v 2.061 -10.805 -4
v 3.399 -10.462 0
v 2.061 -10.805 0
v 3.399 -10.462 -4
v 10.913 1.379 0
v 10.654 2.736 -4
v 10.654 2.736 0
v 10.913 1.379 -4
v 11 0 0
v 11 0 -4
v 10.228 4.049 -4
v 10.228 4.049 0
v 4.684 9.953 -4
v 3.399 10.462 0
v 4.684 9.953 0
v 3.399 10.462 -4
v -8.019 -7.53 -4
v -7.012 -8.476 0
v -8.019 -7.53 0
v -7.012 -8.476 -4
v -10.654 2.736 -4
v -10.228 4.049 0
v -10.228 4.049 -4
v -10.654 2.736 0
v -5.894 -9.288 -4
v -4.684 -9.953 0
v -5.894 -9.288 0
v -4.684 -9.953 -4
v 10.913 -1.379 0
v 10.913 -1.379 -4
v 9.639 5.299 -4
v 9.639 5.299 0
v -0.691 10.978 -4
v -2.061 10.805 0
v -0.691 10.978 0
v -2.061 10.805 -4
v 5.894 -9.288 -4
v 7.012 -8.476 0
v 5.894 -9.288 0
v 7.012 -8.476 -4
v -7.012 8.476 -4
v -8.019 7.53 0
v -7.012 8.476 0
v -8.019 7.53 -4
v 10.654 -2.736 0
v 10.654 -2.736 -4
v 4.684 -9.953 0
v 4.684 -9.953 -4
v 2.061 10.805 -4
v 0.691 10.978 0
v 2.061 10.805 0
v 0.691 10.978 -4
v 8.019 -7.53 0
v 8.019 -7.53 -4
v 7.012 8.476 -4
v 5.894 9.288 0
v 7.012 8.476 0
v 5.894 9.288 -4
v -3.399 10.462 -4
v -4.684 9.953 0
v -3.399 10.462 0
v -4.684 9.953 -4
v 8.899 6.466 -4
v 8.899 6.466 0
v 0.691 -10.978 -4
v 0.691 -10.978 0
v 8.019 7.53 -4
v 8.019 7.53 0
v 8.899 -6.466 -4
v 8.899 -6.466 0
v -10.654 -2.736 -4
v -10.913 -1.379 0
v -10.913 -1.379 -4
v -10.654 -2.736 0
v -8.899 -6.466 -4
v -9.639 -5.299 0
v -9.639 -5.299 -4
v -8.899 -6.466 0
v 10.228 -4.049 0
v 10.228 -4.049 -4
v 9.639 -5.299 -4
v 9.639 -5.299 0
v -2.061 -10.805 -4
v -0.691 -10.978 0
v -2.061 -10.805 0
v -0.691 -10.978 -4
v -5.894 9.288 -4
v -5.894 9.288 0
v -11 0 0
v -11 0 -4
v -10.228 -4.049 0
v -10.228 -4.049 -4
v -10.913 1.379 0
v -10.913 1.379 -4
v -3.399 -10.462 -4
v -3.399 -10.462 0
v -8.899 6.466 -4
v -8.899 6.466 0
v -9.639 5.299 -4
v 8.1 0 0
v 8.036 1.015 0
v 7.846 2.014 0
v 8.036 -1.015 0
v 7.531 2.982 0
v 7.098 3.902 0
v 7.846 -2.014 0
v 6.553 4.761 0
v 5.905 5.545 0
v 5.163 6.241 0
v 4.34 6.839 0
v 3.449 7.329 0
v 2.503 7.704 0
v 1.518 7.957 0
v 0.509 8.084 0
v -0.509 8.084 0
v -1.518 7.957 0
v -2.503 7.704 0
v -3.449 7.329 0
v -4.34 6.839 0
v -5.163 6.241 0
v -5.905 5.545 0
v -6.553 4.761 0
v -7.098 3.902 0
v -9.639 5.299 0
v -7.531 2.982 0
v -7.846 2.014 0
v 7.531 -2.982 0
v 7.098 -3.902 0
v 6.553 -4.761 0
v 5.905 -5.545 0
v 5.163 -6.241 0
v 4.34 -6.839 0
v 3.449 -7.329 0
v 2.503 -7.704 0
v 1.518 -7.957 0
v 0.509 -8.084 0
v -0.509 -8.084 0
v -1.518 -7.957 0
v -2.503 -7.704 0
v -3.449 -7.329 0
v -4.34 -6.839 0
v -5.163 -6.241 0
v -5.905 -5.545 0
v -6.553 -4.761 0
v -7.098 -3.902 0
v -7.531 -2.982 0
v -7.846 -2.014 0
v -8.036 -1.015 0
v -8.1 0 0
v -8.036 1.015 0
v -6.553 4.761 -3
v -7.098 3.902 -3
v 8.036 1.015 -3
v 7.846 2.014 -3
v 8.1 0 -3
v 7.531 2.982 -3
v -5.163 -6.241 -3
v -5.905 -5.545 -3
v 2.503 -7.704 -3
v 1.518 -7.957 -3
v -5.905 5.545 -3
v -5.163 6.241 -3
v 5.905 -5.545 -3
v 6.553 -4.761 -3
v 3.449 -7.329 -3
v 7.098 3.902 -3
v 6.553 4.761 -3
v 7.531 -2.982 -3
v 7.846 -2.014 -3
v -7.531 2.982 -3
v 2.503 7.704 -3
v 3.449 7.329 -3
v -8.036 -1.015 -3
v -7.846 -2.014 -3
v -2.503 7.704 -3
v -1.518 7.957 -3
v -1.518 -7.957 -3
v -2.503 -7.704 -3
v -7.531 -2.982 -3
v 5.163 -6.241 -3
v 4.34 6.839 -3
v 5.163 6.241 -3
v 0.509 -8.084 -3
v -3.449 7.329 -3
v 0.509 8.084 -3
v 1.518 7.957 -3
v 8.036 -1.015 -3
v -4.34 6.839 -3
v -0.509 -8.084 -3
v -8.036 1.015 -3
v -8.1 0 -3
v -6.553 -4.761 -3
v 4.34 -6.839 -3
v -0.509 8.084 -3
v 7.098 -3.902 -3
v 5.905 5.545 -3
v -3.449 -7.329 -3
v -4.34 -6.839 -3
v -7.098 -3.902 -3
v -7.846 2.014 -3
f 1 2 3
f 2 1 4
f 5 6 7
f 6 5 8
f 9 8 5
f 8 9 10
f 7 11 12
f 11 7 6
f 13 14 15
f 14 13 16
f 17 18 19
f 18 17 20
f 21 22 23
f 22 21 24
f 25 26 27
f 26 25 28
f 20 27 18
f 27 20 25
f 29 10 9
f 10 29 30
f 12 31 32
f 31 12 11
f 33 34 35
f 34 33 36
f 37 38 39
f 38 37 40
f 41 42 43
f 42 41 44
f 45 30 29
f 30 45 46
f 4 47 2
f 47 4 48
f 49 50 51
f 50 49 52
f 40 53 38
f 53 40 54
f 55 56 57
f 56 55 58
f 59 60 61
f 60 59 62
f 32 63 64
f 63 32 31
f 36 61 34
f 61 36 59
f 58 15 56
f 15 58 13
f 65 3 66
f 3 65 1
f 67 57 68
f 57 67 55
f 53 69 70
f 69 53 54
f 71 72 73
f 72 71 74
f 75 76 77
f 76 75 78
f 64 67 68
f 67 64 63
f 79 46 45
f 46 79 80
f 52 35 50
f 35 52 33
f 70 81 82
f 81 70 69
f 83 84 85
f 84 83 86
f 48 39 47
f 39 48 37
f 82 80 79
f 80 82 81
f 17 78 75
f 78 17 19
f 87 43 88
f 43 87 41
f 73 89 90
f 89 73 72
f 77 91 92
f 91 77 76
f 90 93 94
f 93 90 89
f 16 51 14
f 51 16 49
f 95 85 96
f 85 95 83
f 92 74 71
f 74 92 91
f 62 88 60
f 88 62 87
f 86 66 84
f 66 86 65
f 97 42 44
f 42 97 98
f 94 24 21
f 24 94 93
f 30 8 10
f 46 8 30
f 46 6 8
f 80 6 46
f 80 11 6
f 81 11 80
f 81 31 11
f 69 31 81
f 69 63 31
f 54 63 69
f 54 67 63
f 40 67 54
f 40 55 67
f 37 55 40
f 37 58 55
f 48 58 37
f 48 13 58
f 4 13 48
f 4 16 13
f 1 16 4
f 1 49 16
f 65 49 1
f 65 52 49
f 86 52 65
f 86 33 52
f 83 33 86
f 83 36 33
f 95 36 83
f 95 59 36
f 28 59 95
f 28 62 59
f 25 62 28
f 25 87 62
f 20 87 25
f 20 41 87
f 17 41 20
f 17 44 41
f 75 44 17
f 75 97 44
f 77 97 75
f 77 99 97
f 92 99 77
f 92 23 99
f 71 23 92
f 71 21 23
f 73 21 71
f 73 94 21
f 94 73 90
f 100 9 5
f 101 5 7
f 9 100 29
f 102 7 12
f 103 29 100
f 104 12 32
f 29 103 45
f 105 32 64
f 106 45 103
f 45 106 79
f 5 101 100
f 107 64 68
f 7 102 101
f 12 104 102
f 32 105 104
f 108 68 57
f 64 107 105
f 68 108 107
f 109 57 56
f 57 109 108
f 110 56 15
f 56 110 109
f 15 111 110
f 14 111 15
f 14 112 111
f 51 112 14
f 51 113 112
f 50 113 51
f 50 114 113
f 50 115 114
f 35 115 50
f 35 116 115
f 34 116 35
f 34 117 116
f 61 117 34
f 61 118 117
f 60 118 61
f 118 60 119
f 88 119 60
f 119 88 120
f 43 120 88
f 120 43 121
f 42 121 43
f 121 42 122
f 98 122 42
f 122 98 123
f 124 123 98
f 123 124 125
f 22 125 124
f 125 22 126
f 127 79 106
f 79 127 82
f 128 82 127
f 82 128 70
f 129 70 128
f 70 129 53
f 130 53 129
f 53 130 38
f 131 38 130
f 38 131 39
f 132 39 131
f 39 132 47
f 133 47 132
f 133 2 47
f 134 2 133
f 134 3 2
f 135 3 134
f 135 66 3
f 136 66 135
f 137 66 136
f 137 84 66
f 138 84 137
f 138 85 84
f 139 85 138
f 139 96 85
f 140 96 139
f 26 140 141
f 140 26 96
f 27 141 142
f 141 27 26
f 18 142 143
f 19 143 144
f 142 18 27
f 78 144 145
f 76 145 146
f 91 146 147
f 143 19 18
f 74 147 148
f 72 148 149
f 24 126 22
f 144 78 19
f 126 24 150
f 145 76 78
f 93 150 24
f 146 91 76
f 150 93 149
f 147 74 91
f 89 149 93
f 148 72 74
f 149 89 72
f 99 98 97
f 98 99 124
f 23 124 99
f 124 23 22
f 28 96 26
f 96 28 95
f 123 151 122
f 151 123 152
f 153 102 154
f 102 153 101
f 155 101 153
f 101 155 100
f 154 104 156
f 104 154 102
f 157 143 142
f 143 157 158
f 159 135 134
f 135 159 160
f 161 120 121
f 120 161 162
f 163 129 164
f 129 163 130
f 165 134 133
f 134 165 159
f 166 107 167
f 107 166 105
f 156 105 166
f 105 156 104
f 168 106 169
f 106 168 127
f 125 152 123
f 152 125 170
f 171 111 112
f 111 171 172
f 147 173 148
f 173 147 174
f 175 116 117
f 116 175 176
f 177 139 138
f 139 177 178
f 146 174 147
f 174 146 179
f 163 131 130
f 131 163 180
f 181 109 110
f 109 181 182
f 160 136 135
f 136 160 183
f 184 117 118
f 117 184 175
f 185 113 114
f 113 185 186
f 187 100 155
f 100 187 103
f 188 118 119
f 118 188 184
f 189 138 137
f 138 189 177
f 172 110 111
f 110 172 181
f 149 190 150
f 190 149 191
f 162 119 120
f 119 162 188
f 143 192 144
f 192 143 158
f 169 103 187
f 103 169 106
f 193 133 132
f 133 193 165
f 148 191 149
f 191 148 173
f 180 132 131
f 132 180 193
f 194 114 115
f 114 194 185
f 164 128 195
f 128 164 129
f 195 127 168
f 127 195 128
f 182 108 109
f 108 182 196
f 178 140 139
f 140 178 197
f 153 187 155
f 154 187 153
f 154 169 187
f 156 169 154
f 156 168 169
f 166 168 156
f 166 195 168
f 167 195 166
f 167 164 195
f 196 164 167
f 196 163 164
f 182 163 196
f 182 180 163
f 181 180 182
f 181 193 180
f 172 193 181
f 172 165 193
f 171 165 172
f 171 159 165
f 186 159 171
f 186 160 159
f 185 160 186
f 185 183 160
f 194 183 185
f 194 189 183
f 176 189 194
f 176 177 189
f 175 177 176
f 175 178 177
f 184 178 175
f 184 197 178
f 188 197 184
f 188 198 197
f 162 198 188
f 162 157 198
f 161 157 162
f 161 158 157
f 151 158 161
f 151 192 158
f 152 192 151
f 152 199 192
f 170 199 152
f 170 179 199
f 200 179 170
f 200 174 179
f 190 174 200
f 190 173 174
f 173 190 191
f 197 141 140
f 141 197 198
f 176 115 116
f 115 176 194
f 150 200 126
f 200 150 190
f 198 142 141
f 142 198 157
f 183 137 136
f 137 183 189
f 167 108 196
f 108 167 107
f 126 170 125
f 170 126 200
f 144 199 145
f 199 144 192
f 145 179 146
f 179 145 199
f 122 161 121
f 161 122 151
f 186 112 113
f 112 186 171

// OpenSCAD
$fn = 50;


difference() {
	union() {
		translate(v = [0, 0, -4.0000000000]) {
			cylinder(h = 4, r = 11.0000000000);
		}
	}
	union() {
		#translate(v = [0, 0, -3.0000000000]) {
			cylinder(h = 3, r = 8.1000000000);
		}
	}
}
